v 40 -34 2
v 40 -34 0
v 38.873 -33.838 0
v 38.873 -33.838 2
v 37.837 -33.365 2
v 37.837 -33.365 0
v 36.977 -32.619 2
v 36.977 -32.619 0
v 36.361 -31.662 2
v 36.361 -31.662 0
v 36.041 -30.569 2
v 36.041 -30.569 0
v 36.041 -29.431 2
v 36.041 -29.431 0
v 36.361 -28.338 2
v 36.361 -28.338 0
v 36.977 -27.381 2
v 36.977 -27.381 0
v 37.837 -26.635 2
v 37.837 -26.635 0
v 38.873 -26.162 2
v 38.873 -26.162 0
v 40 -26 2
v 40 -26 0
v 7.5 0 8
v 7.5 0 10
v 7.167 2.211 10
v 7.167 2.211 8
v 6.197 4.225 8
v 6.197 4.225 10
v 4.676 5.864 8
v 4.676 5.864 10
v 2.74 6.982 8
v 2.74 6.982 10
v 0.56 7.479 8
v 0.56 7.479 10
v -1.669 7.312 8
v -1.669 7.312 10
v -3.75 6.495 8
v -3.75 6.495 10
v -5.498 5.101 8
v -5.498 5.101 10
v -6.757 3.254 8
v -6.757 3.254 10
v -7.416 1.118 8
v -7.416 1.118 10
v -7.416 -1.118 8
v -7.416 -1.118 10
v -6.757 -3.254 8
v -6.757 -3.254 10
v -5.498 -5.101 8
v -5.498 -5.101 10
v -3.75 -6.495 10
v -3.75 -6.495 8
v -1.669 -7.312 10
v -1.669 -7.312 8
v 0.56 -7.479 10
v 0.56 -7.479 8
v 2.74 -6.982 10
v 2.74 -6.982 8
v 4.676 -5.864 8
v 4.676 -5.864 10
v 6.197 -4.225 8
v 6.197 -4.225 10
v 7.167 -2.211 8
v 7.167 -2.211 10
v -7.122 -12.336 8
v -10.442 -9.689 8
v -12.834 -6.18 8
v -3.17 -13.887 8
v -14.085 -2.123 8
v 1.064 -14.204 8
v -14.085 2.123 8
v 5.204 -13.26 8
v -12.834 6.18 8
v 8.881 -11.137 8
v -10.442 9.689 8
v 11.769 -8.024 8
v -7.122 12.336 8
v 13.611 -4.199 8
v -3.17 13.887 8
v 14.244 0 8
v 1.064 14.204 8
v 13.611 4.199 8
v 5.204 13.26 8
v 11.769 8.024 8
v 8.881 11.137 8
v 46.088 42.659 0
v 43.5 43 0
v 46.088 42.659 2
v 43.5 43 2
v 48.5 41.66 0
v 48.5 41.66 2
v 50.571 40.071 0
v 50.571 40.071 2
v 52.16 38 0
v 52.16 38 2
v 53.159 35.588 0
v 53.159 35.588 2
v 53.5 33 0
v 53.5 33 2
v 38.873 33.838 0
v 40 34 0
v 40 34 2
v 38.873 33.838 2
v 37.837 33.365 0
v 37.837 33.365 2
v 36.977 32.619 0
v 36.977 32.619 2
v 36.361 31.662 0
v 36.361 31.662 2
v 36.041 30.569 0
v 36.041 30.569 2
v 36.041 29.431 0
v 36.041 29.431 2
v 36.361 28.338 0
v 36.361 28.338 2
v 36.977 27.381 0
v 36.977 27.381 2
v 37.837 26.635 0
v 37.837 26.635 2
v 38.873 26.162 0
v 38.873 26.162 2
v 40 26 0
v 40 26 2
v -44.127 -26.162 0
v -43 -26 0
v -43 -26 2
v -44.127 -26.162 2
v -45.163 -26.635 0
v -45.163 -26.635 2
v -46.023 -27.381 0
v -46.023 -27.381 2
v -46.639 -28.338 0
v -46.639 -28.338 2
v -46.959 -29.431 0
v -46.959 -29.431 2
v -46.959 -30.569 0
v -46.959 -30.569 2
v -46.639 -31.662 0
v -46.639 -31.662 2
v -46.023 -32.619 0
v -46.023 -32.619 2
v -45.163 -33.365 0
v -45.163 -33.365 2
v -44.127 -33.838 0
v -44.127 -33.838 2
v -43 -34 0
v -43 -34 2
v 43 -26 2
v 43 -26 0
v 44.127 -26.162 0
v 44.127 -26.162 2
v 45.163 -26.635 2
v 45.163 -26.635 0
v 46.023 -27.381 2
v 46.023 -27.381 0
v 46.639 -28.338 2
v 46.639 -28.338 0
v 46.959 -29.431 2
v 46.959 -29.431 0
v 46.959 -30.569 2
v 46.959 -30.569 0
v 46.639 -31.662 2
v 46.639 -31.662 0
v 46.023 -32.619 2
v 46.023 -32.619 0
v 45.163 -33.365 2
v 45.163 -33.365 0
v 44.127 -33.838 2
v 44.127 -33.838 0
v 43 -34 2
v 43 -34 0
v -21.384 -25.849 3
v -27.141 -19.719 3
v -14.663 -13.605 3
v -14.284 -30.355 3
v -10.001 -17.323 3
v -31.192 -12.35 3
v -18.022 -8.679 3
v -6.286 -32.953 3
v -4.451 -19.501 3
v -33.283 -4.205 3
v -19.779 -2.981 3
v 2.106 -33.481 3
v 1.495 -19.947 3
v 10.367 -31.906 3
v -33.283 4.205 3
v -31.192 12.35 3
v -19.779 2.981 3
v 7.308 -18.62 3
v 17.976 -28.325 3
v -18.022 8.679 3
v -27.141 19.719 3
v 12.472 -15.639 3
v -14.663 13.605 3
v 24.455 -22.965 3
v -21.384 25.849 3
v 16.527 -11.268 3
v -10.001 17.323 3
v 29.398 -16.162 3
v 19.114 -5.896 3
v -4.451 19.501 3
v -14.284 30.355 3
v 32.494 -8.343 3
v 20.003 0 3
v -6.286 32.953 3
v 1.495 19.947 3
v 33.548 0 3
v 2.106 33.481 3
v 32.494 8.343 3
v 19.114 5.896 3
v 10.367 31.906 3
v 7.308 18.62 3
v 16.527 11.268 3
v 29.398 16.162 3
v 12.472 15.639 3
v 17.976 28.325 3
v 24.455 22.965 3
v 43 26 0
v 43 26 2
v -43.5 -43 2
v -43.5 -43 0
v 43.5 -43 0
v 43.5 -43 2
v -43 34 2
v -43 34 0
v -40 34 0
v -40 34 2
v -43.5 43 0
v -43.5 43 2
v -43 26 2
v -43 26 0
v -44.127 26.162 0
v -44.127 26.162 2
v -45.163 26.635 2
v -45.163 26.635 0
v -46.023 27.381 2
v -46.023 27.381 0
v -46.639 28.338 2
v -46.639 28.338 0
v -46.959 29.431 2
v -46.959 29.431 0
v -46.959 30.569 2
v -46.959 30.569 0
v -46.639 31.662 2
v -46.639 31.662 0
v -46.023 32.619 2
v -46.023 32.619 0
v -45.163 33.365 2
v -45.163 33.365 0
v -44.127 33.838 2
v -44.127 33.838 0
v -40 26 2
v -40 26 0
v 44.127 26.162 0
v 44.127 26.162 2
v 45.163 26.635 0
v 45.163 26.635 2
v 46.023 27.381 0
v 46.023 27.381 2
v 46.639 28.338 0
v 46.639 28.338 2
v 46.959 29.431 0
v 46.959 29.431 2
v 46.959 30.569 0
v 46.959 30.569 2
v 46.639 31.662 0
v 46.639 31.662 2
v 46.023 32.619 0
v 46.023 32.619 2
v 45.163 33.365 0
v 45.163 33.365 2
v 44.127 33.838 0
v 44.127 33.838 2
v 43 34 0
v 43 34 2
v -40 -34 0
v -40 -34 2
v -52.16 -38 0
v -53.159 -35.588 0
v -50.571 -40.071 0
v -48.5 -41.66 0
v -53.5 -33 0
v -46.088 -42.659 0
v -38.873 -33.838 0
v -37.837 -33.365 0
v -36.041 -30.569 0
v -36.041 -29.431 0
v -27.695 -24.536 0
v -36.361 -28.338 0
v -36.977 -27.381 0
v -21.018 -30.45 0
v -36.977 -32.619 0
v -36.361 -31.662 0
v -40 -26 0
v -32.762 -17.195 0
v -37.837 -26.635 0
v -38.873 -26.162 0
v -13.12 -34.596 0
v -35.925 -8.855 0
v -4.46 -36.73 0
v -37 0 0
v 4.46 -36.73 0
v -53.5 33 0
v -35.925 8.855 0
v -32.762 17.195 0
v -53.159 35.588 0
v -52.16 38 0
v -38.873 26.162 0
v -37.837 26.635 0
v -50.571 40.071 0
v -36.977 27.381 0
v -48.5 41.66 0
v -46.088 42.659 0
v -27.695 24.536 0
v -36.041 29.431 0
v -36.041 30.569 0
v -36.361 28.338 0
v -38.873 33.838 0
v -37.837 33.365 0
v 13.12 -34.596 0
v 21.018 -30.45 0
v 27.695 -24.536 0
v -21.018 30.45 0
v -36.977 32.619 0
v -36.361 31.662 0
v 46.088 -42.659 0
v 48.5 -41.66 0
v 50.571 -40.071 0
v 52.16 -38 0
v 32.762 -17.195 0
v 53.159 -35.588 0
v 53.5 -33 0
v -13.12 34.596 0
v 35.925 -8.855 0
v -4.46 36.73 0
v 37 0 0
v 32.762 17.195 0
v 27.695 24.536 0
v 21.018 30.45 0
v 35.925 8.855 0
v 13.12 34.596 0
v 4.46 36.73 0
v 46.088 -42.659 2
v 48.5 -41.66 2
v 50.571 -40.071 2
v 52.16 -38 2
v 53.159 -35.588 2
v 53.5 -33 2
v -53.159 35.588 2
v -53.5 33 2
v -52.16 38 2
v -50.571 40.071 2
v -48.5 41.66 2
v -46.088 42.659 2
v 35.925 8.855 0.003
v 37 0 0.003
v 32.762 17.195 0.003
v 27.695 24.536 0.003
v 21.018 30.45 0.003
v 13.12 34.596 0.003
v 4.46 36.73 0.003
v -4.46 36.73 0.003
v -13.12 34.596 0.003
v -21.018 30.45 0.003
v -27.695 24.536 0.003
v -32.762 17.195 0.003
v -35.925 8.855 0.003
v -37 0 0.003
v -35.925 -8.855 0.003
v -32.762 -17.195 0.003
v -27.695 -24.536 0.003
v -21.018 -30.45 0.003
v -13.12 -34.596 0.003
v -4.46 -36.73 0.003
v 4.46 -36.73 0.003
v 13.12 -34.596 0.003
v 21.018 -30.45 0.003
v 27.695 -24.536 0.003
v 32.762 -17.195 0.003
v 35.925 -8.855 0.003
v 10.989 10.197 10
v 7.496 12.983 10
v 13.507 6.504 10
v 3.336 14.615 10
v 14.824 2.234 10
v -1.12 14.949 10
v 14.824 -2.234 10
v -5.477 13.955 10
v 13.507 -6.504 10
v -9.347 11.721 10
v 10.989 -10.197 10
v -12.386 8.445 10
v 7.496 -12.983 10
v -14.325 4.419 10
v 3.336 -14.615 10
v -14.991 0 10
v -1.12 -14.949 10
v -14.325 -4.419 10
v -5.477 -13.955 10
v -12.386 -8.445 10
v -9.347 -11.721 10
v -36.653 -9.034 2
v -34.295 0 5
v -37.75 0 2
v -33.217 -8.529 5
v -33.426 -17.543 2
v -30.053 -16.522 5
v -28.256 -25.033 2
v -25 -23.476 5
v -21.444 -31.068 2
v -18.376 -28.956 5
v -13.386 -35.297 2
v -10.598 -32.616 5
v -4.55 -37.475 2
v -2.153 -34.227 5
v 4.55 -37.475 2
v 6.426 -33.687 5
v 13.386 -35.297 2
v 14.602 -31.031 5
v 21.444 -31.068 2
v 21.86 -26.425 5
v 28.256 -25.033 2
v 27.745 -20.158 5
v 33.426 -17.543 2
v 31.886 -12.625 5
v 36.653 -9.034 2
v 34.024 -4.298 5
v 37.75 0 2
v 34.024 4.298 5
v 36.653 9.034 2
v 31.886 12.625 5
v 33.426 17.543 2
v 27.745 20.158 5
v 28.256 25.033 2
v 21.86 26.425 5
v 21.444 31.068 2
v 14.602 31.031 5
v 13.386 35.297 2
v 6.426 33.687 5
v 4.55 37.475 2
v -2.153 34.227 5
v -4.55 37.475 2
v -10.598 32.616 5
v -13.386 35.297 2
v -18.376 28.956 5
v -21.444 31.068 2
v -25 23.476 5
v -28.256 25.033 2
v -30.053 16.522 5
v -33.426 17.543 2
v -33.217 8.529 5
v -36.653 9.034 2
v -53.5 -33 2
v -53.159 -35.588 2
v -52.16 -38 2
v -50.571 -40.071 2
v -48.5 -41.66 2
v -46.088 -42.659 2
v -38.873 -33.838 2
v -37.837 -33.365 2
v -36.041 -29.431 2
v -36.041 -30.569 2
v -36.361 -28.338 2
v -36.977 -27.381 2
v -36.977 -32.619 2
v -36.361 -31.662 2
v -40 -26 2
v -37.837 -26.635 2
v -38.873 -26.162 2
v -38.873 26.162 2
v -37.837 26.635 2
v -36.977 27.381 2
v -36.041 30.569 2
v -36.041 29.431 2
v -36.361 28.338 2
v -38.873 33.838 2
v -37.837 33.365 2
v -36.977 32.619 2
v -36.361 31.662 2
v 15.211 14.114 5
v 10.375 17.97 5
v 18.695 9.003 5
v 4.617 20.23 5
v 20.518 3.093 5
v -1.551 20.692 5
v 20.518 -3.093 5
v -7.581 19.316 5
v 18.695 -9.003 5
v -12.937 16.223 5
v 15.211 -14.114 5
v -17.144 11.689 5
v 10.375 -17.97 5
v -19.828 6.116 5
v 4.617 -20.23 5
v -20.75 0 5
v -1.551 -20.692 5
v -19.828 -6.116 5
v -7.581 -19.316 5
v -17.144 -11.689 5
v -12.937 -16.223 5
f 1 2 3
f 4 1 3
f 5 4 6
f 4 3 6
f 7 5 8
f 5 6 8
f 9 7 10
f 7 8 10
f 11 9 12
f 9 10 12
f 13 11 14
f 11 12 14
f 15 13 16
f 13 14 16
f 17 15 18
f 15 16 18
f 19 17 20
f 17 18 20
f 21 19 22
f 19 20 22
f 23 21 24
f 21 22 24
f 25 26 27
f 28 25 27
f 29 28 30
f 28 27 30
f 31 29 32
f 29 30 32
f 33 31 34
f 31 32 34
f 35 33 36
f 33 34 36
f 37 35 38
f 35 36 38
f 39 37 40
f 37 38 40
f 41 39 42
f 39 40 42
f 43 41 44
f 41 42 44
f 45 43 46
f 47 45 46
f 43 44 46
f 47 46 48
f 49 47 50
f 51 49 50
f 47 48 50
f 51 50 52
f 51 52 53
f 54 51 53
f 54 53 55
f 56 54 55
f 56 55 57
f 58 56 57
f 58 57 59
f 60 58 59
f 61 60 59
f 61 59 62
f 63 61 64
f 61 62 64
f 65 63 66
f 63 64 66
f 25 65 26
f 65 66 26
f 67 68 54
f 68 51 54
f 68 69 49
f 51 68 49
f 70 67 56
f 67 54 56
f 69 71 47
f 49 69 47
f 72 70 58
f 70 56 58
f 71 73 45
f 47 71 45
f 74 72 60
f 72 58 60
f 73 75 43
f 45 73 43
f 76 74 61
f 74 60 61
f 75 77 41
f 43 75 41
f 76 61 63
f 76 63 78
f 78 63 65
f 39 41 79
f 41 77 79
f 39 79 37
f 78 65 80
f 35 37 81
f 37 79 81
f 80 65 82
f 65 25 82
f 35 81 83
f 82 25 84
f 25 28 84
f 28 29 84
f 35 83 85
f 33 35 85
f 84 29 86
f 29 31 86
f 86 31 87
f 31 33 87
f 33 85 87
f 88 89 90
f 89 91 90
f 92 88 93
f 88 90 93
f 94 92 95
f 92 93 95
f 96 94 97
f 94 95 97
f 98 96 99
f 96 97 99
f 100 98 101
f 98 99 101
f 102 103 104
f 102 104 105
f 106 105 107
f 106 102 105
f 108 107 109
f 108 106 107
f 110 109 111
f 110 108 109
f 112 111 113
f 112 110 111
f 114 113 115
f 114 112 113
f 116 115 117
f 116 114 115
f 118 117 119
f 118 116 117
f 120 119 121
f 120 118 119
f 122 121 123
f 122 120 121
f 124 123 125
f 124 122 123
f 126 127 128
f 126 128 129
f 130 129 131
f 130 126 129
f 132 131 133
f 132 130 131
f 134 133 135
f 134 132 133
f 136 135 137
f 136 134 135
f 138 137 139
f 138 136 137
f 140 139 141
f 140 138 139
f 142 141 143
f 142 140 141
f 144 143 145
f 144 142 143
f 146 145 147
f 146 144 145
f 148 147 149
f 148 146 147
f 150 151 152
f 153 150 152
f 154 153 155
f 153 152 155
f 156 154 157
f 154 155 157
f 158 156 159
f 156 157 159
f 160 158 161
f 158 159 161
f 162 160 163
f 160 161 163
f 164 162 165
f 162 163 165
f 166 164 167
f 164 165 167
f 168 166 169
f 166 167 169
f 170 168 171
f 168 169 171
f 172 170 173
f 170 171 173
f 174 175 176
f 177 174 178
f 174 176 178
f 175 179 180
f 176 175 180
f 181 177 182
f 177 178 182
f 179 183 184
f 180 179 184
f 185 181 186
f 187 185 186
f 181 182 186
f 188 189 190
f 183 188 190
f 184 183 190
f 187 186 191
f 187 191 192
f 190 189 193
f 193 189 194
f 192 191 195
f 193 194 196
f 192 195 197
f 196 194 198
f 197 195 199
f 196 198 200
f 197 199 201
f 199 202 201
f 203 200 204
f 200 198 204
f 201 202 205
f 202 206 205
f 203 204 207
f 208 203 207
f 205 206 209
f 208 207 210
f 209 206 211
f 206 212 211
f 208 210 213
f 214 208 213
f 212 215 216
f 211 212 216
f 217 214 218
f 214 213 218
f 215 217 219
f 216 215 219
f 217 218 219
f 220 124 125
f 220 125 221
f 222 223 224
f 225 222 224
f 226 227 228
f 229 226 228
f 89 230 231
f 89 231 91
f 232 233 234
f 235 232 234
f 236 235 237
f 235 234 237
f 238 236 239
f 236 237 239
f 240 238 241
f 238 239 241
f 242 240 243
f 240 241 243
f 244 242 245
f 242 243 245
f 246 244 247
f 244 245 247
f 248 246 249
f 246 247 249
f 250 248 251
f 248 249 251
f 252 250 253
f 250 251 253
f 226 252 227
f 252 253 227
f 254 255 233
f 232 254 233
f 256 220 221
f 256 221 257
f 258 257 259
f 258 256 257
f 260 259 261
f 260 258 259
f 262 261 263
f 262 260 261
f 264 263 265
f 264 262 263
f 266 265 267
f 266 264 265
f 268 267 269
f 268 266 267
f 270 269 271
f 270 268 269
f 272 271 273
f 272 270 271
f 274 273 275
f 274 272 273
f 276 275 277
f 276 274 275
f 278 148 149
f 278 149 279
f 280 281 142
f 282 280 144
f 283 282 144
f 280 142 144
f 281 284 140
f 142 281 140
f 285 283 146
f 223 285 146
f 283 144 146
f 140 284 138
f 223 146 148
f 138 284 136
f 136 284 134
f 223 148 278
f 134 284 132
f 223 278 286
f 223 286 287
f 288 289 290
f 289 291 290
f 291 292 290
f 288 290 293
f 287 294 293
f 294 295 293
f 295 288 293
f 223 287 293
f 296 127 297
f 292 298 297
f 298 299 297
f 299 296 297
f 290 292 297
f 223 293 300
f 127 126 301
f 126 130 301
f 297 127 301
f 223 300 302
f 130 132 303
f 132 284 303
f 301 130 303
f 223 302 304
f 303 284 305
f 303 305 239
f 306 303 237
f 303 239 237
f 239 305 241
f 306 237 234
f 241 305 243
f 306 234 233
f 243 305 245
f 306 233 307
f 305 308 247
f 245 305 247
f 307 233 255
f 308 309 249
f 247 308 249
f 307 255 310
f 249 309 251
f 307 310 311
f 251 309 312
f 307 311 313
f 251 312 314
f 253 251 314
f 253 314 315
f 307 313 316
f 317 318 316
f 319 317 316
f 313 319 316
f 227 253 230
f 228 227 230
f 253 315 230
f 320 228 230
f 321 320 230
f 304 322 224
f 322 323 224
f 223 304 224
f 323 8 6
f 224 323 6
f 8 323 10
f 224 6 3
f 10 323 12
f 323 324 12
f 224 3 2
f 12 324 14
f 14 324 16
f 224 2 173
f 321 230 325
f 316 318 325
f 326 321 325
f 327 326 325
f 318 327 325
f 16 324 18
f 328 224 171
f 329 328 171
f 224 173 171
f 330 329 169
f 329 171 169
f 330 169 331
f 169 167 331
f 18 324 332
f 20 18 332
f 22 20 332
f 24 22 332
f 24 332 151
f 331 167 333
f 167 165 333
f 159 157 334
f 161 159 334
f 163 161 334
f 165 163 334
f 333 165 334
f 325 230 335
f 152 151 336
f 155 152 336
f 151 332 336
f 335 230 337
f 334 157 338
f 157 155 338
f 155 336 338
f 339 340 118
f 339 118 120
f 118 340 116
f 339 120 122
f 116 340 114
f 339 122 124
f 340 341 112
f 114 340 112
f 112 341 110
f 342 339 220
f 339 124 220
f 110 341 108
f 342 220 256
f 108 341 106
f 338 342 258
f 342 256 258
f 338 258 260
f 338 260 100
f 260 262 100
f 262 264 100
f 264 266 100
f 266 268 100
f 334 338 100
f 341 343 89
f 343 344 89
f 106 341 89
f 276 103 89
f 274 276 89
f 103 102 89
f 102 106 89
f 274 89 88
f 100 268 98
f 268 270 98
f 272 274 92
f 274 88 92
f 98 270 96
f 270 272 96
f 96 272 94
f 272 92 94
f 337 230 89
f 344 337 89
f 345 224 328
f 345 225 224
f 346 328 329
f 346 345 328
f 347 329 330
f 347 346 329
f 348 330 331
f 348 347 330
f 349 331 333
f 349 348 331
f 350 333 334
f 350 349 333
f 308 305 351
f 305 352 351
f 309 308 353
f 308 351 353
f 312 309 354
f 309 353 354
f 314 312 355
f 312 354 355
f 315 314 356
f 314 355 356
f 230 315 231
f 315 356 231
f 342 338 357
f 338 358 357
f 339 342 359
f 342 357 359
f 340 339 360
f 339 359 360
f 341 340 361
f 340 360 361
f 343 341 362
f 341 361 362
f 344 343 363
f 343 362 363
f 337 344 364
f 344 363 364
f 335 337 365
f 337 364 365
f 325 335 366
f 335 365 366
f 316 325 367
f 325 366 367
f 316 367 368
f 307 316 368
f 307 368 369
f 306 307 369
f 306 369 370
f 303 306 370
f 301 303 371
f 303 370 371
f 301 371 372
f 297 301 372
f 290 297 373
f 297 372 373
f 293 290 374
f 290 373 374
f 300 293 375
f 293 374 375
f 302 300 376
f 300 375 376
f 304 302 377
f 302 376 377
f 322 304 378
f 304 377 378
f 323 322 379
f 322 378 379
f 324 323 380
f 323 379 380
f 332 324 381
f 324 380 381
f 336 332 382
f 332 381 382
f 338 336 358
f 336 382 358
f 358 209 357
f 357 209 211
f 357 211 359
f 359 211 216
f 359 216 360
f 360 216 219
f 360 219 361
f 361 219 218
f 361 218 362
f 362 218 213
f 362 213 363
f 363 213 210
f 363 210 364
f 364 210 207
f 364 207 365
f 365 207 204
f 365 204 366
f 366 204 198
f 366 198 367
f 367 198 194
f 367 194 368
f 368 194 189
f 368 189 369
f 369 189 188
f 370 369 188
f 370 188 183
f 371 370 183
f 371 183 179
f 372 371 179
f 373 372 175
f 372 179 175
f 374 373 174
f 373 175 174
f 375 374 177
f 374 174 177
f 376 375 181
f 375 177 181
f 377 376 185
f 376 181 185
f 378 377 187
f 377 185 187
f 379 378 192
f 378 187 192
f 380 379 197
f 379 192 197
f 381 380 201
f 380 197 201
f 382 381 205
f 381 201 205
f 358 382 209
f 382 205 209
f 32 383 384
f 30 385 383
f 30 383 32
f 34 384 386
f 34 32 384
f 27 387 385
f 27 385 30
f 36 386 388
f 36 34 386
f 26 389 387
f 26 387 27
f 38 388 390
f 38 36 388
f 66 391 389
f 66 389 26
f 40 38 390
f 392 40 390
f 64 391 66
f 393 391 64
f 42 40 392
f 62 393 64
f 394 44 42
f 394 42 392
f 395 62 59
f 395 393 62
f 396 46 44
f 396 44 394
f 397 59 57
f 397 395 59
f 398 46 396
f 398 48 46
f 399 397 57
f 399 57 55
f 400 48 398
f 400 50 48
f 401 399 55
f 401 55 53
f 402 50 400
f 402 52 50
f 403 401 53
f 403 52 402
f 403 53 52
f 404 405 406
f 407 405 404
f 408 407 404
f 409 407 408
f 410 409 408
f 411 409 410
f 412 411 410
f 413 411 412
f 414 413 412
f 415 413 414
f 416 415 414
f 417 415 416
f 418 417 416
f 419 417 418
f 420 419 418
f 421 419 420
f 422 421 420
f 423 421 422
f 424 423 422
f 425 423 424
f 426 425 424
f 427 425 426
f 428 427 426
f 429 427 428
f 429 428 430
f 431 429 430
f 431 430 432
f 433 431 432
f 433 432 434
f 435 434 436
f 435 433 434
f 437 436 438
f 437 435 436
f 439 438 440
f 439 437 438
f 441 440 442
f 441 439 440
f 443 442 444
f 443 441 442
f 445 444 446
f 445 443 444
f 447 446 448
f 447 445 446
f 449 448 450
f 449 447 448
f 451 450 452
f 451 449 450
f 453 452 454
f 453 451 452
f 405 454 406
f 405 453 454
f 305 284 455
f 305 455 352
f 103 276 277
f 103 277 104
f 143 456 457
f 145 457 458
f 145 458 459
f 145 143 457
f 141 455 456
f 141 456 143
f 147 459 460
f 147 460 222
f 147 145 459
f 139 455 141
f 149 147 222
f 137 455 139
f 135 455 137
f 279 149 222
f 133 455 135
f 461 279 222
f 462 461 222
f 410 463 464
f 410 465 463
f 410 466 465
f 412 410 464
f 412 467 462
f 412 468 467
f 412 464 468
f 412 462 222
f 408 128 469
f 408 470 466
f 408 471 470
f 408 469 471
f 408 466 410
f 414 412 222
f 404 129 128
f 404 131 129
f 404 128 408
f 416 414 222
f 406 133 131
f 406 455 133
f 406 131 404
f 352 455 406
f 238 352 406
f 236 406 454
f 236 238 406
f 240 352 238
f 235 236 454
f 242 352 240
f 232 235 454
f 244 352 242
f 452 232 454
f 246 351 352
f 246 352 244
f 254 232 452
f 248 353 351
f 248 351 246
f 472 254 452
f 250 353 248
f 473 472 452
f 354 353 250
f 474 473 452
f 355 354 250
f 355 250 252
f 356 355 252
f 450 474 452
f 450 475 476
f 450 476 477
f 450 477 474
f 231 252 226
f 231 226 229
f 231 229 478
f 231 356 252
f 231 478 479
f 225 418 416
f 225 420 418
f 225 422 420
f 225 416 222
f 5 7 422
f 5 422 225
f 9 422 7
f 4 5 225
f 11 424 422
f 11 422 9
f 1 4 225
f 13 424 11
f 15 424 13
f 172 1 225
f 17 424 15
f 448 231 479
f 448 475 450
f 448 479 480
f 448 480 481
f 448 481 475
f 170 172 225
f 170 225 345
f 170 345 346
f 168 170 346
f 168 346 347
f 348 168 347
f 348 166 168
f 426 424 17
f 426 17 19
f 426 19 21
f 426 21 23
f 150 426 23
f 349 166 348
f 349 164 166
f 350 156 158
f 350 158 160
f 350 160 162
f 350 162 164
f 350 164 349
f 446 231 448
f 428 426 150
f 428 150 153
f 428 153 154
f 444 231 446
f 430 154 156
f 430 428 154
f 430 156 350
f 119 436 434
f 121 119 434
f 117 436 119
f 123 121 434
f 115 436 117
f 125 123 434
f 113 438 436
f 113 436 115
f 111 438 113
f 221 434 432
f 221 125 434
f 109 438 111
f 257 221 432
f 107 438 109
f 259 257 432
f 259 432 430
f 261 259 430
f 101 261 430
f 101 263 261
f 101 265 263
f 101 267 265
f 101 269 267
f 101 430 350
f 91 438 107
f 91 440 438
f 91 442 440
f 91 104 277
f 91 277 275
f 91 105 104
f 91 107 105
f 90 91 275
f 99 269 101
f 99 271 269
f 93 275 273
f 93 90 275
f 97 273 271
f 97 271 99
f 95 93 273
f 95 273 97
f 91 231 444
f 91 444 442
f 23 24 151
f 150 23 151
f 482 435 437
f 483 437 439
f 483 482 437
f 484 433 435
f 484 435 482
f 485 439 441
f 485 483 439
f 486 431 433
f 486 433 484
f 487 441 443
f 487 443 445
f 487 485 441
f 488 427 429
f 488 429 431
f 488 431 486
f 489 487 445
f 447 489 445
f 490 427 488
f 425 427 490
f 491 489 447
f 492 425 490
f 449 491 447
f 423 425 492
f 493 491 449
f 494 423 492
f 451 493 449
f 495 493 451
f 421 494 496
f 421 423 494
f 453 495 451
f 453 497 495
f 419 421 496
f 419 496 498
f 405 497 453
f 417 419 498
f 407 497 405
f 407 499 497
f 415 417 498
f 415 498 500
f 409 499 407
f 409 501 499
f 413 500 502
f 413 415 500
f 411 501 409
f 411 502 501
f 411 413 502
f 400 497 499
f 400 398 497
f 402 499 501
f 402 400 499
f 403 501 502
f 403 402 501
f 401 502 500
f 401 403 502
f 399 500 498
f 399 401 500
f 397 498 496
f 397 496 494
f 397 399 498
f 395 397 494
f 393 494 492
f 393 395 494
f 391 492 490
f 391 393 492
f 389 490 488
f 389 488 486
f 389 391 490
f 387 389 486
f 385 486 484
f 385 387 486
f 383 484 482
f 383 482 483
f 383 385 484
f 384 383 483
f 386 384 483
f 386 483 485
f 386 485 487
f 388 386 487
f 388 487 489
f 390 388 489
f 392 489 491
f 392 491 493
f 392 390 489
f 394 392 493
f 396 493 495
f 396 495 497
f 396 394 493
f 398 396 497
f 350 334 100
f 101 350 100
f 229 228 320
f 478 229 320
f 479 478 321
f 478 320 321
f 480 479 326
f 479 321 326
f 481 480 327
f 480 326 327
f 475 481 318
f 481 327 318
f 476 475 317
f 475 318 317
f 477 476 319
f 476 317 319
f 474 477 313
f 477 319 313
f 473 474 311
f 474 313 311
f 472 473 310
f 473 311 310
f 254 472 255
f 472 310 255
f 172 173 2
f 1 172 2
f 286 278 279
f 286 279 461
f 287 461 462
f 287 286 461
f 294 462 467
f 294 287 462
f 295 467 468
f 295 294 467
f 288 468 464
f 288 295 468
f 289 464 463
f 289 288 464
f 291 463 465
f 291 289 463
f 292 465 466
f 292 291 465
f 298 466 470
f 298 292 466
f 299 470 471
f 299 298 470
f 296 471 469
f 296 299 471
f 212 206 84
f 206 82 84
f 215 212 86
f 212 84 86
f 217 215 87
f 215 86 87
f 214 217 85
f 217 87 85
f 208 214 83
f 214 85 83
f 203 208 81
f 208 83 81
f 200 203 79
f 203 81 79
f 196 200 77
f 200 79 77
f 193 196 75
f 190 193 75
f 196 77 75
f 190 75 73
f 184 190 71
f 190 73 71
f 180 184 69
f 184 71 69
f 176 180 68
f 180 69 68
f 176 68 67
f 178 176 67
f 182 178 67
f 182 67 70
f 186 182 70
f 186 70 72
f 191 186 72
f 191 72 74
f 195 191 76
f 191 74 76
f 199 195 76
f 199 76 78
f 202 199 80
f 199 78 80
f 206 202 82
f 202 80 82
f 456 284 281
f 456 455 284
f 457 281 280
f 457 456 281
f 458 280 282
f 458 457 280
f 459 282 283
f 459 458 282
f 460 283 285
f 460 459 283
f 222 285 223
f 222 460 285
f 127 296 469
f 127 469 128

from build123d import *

# Parameters (mm, degrees)
SKETCH1_W           = 107
SKETCH1_H           = 86
BOSS_EXTRUDE1_DEPTH = 2
FILLET1_R           = 10
SKETCH5_R           = 7.5
CUT_EXTRUDE1_DEPTH  = 2


# Read off the part's stored shape, not the designer's step: Shell2
with BuildPart() as part:
    # Sketch1 → Boss-Extrude1 (new body)
    with BuildSketch(Plane.XY):
        Rectangle(SKETCH1_W, SKETCH1_H)
        with BuildLine():
            Line((-43, 34), (-40, 34))
            ThreePointArc((-40, 34), (-36, 30), (-40, 26))
            Line((-40, 26), (-43, 26))
            ThreePointArc((-43, 26), (-47, 30), (-43, 34))
        make_face(mode=Mode.SUBTRACT)
        with BuildLine():
            Line((43, 34), (40, 34))
            ThreePointArc((40, 34), (36, 30), (40, 26))
            Line((40, 26), (43, 26))
            ThreePointArc((43, 26), (47, 30), (43, 34))
        make_face(mode=Mode.SUBTRACT)
        with BuildLine():
            Line((43, -34), (40, -34))
            ThreePointArc((40, -34), (36, -30), (40, -26))
            Line((40, -26), (43, -26))
            ThreePointArc((43, -26), (47, -30), (43, -34))
        make_face(mode=Mode.SUBTRACT)
        with BuildLine():
            Line((-43, -34), (-40, -34))
            ThreePointArc((-40, -34), (-36, -30), (-40, -26))
            Line((-40, -26), (-43, -26))
            ThreePointArc((-43, -26), (-47, -30), (-43, -34))
        make_face(mode=Mode.SUBTRACT)
    extrude(amount=BOSS_EXTRUDE1_DEPTH)

    # Fillet1
    fillet1_edges = [part.edges().sort_by_distance(p)[0] for p in [
        (-53.5, 43, 1),
        (53.5, 43, 1),
        (53.5, -43, 1),
        (-53.5, -43, 1),
    ]]
    fillet(fillet1_edges, radius=FILLET1_R)

    # Sketch3 → Revolve1 (revolve)
    with BuildSketch(Plane(origin=(0, 0, 0), x_dir=(1, 0, 0), z_dir=(0, 1, 0)), mode=Mode.PRIVATE) as revolve1_sk:
        Polygon((37.75, -2), (34.294777143, -5), (20.75, -5), (14.991295238, -10), (0, -10), (0, -2), align=None)
    revolve(revolve1_sk.sketch.rotate(Axis((0, 0, 0), (0, 0, 1)), 180), axis=Axis((0, 0, 0), (0, 0, 1)))

    # Shell2 outline → Shell2 (revolve, cut)
    with BuildSketch(Plane.XZ):
        Polygon((37, 0), (37, 0.002520926), (33.547680597, 3), (20.002903454, 3), (14.244198692, 8), (0, 8), (0, 0), align=None)
    revolve(axis=Axis((0, 0, 0), (0, 0, 1)), mode=Mode.SUBTRACT)

    # Sketch5 → Cut-Extrude1 (cut)
    with BuildSketch(Plane.XY.offset(10)):
        Circle(SKETCH5_R)
    extrude(amount=-CUT_EXTRUDE1_DEPTH, mode=Mode.SUBTRACT)


solid = part.part
